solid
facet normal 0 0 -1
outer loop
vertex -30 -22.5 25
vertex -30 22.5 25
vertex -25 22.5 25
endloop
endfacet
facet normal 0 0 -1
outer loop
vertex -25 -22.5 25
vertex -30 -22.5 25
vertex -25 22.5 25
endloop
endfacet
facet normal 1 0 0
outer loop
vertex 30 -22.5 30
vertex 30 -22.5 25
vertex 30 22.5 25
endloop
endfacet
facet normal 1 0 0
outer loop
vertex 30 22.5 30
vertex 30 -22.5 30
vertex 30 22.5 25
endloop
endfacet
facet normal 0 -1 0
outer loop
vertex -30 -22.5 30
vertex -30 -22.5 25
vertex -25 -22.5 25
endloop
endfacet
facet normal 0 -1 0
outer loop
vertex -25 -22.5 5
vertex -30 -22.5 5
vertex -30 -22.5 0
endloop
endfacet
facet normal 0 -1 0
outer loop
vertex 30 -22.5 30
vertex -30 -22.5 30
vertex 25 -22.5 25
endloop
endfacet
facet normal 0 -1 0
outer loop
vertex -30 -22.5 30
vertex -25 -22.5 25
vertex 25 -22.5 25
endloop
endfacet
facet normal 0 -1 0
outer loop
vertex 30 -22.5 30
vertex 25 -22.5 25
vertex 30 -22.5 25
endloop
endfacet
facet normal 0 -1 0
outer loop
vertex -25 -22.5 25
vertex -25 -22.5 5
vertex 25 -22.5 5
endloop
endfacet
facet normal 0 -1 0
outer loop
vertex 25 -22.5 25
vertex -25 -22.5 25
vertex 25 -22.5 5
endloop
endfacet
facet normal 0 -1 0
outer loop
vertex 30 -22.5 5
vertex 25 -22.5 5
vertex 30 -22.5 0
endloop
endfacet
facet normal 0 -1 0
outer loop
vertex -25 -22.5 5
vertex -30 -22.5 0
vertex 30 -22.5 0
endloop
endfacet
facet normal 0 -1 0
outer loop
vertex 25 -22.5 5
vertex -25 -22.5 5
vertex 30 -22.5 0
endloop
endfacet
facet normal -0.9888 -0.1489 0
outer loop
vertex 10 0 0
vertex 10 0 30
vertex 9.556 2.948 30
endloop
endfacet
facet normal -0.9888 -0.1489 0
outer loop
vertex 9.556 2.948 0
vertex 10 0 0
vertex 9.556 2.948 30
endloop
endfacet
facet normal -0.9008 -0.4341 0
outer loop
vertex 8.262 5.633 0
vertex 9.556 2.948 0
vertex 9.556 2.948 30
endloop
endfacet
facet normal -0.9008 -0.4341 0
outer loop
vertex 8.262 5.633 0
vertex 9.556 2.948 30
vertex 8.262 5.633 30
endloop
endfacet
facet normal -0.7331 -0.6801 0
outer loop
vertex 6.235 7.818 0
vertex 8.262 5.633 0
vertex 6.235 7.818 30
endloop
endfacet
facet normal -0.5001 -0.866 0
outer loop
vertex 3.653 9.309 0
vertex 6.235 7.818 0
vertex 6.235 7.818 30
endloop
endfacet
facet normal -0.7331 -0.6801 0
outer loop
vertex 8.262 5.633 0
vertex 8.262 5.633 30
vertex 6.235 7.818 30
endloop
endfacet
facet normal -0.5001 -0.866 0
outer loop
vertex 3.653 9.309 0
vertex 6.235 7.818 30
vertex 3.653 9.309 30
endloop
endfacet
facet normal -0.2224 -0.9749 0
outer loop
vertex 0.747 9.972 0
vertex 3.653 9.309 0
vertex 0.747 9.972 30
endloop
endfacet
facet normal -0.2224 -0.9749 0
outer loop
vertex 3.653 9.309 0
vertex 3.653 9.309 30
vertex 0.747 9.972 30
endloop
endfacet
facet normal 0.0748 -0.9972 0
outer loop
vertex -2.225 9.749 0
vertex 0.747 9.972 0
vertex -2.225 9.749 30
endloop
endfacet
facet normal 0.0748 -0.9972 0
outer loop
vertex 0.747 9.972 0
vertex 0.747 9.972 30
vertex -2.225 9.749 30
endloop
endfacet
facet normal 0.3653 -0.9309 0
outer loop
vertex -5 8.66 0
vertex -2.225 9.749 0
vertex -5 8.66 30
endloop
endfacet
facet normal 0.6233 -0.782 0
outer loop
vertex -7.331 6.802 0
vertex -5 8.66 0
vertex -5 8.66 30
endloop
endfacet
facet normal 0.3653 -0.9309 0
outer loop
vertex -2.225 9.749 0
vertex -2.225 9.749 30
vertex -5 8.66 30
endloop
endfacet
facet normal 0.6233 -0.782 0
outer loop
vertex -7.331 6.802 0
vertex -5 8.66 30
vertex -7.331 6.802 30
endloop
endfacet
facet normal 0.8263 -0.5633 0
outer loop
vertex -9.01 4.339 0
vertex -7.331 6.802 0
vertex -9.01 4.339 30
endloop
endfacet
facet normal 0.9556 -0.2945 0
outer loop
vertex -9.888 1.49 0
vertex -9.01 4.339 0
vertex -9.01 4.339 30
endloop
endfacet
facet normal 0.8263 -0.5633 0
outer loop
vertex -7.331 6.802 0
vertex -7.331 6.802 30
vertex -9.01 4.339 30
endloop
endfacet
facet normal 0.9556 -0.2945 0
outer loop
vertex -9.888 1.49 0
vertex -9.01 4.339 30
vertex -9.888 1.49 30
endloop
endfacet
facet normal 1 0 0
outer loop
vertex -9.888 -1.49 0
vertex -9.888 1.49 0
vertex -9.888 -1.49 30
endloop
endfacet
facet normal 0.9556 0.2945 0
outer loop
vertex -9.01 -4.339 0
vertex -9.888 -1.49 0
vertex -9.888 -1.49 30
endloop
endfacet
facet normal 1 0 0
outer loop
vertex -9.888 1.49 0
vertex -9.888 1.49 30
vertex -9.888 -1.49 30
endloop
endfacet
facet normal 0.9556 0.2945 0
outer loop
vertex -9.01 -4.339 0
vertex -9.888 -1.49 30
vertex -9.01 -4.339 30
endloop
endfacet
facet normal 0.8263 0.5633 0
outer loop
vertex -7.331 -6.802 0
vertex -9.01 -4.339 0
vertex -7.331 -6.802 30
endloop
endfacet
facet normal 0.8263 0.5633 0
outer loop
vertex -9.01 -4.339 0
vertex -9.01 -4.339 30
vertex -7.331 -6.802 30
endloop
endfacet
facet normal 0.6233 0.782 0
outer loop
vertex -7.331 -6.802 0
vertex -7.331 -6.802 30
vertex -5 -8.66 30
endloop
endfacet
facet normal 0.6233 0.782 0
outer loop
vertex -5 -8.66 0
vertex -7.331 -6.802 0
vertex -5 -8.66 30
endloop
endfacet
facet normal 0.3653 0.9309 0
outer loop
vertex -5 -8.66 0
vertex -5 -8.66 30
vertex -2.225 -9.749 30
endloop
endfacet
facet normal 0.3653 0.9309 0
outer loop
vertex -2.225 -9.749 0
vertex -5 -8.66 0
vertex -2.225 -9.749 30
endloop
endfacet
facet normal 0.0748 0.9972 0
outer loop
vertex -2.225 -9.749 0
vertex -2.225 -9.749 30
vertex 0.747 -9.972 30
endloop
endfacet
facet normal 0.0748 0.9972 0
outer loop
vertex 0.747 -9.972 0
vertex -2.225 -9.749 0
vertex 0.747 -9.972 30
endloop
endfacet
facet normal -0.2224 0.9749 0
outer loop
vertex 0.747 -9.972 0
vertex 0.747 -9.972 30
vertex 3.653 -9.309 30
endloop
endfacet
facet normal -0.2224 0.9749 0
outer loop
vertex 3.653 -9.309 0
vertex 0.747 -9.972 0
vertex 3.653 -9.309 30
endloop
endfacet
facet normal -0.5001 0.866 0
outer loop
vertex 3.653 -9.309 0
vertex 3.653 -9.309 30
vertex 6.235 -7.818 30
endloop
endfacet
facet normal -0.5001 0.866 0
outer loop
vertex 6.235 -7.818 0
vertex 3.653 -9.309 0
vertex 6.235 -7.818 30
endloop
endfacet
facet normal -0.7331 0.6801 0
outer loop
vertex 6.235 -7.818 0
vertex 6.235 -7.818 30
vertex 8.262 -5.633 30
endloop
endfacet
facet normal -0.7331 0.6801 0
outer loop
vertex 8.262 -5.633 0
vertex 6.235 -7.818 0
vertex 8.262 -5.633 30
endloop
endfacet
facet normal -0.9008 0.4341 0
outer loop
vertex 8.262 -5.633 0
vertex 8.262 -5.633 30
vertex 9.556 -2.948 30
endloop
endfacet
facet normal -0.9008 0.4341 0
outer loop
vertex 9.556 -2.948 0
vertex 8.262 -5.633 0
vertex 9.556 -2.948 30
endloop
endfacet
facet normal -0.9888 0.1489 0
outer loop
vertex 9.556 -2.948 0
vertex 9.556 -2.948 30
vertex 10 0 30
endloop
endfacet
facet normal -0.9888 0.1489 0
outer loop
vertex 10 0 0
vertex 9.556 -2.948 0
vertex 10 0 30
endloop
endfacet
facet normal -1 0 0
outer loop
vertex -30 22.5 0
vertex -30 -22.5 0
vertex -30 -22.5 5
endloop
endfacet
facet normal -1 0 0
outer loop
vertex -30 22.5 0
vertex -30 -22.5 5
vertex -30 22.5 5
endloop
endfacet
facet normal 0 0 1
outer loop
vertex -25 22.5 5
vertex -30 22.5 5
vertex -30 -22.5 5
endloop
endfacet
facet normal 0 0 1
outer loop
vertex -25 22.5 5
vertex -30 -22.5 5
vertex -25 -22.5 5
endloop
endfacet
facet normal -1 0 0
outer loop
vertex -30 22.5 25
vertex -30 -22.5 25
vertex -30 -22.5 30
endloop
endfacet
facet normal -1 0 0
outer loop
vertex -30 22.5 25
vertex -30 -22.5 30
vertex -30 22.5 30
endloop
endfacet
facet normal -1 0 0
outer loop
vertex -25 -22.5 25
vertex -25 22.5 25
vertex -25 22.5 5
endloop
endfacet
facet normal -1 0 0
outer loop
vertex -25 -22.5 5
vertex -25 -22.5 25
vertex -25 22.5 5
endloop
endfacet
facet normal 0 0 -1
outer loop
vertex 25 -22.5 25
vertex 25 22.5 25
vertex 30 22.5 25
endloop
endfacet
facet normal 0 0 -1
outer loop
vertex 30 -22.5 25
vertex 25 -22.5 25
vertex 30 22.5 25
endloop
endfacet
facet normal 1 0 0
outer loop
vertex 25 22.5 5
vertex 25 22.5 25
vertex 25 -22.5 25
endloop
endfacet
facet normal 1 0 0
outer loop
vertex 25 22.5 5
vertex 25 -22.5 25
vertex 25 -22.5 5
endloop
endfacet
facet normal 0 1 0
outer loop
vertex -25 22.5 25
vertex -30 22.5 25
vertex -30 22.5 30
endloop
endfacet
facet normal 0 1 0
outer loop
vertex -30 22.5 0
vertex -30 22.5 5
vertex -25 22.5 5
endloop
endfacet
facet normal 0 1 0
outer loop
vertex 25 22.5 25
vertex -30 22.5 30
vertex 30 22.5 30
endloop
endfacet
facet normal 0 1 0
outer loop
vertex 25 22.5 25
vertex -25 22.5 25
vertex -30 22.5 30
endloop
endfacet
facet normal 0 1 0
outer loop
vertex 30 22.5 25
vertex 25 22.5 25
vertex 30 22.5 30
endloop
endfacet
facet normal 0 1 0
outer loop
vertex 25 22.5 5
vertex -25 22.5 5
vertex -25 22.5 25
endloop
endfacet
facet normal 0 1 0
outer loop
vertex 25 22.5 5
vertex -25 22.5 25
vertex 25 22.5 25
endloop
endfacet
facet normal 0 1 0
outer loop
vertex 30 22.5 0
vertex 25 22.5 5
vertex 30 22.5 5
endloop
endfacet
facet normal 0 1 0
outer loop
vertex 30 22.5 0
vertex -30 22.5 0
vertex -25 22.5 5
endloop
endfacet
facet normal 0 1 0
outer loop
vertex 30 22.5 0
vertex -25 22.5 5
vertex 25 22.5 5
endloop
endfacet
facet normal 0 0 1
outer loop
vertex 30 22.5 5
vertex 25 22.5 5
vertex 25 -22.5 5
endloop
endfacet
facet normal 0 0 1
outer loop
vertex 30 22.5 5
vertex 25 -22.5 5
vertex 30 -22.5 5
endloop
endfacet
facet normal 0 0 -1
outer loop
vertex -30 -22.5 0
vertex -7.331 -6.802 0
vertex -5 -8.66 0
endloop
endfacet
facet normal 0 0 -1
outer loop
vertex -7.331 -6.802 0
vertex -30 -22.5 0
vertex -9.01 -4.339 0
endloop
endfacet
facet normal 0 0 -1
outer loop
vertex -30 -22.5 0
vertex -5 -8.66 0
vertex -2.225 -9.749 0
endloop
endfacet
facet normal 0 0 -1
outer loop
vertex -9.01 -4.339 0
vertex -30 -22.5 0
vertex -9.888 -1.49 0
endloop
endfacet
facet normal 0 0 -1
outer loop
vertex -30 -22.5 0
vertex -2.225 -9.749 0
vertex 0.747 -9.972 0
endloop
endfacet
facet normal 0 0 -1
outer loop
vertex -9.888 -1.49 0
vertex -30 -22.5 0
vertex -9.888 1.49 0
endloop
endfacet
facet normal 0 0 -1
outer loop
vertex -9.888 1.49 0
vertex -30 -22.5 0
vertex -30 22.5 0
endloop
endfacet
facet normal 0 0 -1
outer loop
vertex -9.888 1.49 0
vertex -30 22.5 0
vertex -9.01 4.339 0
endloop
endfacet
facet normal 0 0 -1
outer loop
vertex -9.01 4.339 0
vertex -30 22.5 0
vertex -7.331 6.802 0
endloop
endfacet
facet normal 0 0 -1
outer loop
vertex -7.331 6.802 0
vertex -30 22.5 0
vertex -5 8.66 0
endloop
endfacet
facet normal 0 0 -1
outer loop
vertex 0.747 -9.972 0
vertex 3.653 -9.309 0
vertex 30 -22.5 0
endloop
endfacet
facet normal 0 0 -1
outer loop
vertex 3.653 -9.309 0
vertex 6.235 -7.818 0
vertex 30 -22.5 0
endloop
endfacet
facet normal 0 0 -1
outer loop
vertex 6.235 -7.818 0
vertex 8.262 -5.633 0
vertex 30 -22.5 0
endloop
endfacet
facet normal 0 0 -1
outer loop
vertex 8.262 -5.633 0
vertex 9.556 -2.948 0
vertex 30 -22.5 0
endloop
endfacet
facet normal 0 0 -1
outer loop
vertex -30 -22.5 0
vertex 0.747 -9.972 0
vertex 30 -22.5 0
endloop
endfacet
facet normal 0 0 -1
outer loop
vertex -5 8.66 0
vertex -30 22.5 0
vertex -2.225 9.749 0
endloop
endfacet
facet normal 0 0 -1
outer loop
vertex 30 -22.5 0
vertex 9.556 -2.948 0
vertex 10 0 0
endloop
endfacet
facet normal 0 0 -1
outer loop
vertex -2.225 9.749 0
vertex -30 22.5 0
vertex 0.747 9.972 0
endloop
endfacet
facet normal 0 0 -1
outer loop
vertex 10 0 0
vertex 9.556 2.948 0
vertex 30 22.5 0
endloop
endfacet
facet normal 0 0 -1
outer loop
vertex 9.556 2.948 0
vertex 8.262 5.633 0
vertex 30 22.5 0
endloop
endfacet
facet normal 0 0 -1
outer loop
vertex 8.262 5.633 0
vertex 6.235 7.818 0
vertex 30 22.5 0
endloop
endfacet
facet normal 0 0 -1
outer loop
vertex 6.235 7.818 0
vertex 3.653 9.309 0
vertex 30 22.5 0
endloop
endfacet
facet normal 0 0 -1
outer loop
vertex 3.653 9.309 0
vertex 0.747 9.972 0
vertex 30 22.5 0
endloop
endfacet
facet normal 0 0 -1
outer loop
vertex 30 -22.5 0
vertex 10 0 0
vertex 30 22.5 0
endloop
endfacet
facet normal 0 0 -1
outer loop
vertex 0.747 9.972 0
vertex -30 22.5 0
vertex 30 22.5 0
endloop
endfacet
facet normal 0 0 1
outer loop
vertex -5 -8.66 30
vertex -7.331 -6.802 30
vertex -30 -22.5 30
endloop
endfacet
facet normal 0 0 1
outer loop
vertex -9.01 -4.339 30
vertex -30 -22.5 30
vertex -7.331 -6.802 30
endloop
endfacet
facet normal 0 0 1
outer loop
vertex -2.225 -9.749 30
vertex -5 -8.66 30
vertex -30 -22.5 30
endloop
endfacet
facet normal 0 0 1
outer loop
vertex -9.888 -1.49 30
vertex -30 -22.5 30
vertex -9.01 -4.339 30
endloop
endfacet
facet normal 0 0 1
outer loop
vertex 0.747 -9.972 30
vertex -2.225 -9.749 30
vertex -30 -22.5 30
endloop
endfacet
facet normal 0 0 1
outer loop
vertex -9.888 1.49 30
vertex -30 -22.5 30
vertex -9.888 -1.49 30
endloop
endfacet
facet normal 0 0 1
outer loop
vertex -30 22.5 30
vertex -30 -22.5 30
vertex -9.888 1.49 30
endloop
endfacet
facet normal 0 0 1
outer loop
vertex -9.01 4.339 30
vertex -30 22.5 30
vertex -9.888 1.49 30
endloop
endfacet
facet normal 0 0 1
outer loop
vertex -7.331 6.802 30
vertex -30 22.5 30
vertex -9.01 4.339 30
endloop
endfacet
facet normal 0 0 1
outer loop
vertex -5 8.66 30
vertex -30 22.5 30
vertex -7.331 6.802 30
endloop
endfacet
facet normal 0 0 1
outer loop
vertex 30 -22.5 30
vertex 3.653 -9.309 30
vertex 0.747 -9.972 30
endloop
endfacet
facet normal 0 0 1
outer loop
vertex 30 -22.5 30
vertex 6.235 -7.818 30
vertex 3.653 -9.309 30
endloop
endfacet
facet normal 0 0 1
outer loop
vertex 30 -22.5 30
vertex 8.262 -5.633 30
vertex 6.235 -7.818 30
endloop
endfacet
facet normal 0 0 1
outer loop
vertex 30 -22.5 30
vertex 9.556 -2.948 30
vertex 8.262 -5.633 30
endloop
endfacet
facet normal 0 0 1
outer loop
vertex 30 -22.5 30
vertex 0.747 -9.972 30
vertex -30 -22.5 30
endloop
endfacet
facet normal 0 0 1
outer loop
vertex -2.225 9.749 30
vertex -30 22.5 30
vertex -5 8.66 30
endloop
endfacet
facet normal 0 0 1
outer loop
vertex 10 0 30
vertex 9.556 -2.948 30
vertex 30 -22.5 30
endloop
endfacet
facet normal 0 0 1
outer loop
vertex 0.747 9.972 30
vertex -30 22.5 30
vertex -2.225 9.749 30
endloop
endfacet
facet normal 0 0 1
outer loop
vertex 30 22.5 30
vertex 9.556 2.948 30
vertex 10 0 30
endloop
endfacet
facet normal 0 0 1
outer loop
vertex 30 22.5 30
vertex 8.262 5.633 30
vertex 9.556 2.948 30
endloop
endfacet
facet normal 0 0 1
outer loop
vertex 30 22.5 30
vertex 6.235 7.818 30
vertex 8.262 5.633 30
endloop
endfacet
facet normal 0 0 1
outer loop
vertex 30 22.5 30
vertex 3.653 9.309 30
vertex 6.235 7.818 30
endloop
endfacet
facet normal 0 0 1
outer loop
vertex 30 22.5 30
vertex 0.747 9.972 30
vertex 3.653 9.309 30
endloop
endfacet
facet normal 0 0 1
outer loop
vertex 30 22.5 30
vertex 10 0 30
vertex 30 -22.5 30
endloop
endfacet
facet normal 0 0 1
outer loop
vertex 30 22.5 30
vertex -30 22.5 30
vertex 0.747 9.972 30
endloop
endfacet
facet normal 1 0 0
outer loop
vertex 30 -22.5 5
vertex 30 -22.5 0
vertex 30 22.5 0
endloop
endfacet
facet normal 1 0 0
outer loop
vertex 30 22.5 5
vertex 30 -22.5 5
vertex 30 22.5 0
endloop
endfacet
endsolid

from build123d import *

# Parameters (mm, degrees)
SKETCH_1_W          = 60
SKETCH_1_H          = 45
EXTRUDE_1_DEPTH     = 30
SKETCH_2_W          = 15
SKETCH_2_H          = 20
CUT_EXTRUDE_1_DEPTH = 80
SKETCH_3_R          = 10
CUT_EXTRUDE_2_DEPTH = 80


with BuildPart() as part:
    # 草图1 → 凸台-拉伸1 (new body)
    with BuildSketch(Plane.XY):
        Rectangle(SKETCH_1_W, SKETCH_1_H)
    extrude(amount=EXTRUDE_1_DEPTH)

    # 草图2 → 切除-拉伸1 (cut)
    with BuildSketch(Plane(origin=(0, 22.5, 0), x_dir=(1, 0, 0), z_dir=(0, 1, 0))):
        with Locations((-32.5, -15)):
            Rectangle(SKETCH_2_W, SKETCH_2_H)
        with Locations((32.5, -15)):
            Rectangle(SKETCH_2_W, SKETCH_2_H)
    extrude(amount=-CUT_EXTRUDE_1_DEPTH, mode=Mode.SUBTRACT)

    # 草图3 → 切除-拉伸2 (cut)
    with BuildSketch(Plane.XY.offset(30)):
        Circle(SKETCH_3_R)
    extrude(amount=-CUT_EXTRUDE_2_DEPTH, mode=Mode.SUBTRACT)


solid = part.part
